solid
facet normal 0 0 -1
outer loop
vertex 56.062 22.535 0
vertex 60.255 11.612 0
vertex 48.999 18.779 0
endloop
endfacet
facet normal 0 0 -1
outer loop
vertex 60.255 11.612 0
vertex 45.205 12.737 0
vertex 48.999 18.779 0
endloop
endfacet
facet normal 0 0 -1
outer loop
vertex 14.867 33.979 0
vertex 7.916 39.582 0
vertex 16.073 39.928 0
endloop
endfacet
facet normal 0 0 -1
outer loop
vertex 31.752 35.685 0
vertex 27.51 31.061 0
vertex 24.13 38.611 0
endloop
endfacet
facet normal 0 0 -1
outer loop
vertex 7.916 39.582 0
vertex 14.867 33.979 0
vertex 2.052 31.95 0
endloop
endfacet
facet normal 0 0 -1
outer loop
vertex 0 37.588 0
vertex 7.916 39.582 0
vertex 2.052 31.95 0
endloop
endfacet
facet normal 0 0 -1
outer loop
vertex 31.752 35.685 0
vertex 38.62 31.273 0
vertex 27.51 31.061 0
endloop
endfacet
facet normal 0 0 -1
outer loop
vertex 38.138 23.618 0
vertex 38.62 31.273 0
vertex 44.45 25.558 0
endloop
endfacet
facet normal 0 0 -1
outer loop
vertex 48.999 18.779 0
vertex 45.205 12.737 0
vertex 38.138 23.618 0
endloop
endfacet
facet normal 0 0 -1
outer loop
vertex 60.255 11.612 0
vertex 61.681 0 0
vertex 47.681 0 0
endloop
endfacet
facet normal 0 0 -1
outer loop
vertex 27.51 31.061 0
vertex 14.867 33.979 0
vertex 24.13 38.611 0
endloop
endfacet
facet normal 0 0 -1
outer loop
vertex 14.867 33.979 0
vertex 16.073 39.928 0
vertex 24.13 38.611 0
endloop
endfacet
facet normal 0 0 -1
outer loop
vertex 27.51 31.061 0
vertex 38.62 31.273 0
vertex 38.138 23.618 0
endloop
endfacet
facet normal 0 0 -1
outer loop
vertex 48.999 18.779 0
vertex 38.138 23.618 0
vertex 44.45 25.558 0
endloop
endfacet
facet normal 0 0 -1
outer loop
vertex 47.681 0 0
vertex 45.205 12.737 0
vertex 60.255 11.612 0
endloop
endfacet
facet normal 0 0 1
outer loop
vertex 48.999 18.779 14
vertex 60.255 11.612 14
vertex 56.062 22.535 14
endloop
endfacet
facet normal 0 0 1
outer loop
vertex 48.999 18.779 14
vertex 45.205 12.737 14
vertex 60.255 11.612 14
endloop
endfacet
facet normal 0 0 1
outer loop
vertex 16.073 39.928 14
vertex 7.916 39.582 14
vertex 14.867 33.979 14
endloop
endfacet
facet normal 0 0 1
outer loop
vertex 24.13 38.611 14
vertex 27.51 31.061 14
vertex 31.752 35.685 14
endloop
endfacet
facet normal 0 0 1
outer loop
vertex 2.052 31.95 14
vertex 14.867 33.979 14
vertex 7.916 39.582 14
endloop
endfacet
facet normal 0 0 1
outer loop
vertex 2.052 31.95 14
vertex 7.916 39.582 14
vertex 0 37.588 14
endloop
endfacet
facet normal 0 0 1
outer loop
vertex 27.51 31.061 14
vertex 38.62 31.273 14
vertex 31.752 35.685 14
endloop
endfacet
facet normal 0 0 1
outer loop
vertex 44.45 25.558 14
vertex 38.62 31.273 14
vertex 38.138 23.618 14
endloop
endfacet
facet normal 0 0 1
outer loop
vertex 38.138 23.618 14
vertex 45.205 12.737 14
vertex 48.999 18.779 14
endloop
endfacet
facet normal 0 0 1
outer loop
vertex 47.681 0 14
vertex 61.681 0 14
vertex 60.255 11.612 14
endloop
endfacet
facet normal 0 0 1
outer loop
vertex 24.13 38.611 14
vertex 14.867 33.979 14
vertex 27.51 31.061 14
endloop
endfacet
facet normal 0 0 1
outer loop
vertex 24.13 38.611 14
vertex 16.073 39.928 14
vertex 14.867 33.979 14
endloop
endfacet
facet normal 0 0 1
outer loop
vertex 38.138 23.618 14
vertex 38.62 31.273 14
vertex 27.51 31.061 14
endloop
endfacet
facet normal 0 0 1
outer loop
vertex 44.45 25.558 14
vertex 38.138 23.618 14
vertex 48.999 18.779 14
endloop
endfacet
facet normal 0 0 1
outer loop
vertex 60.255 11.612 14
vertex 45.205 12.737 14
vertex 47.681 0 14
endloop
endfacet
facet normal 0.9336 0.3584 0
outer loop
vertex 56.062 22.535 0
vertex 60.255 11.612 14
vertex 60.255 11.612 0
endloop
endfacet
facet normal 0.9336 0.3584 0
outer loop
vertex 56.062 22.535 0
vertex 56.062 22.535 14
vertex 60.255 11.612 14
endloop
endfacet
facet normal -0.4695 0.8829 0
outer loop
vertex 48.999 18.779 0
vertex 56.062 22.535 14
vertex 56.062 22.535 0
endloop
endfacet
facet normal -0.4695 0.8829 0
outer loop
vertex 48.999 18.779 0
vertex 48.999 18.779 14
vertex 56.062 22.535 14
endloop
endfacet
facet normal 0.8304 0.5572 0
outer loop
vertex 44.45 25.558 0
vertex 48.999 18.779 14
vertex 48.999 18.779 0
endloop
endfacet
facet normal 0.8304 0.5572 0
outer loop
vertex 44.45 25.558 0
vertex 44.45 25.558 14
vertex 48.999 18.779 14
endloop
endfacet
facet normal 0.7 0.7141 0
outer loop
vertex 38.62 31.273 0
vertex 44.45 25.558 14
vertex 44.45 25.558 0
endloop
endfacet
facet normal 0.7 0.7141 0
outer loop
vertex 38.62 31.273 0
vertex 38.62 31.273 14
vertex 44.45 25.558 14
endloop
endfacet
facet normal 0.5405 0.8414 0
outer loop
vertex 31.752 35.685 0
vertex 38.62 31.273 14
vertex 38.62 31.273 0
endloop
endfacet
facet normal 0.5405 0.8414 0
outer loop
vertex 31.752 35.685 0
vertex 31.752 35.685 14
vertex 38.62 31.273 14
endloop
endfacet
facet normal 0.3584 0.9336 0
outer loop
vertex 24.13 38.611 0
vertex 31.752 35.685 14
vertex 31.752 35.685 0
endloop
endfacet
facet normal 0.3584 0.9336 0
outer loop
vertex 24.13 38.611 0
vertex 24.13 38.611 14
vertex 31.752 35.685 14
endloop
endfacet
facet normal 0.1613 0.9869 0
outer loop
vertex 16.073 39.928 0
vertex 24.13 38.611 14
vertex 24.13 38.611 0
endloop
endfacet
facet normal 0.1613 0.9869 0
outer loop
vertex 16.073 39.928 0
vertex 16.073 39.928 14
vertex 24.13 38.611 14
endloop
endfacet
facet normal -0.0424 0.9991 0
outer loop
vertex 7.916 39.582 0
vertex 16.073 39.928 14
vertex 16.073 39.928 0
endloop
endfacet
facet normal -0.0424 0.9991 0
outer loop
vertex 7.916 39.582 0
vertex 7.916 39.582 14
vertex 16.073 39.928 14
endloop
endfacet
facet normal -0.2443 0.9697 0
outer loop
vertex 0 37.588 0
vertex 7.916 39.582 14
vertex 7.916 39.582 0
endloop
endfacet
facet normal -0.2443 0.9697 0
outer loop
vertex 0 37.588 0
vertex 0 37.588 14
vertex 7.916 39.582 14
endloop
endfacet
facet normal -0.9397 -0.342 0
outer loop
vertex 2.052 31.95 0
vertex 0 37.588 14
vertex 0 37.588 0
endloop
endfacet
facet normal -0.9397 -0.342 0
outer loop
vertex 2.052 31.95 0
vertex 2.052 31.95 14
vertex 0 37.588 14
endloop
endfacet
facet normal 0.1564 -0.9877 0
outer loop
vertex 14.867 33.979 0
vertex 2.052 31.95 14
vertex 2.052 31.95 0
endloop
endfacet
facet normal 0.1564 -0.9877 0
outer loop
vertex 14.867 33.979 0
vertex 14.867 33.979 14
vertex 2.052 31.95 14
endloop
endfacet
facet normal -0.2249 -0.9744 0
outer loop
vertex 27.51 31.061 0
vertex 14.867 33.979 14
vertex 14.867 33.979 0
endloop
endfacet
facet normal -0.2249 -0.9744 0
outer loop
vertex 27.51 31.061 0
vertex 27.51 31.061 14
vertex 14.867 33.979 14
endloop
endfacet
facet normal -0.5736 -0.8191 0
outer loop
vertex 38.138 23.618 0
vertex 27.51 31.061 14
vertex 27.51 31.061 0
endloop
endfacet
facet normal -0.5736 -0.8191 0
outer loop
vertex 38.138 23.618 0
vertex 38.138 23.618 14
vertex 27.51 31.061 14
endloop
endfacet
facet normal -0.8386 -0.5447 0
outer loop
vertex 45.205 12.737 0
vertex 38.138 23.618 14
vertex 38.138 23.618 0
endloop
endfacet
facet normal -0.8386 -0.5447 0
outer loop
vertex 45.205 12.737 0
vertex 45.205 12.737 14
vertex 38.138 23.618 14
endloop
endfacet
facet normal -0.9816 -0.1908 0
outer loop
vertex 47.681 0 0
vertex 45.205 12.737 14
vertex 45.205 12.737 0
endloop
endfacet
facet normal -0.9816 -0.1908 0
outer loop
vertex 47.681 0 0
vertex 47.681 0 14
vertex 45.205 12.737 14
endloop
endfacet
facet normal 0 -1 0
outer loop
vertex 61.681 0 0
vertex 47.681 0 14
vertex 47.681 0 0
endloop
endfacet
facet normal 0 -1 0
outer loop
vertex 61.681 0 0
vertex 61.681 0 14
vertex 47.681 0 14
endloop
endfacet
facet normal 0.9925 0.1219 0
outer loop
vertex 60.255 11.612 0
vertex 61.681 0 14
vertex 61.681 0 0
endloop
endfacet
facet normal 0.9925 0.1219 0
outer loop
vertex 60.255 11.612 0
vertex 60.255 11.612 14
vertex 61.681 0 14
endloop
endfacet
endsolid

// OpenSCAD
$fn = 32;

// ----------------------------------------------------------------------
// Arc stop: segment, 14 mm thick
// ----------------------------------------------------------------------

// --- parameters (mm) ---
profile_height = 14;      // extrusion height
profile_points = 17;      // points of the closed outline

profile = [[61.681, 0], [60.255, 11.612], [56.062, 22.535], [48.999, 18.779], [44.45, 25.558], [38.62, 31.273], [31.752, 35.685], [24.13, 38.611], [16.073, 39.928], [7.916, 39.582], [0, 37.588], [2.052, 31.95], [14.867, 33.979], [27.51, 31.061], [38.138, 23.618], [45.205, 12.737], [47.681, 0]];  // single closed polygon, 17 points, counter clockwise

// --- the one profile operation ---
linear_extrude(height = profile_height) polygon(points = profile);
